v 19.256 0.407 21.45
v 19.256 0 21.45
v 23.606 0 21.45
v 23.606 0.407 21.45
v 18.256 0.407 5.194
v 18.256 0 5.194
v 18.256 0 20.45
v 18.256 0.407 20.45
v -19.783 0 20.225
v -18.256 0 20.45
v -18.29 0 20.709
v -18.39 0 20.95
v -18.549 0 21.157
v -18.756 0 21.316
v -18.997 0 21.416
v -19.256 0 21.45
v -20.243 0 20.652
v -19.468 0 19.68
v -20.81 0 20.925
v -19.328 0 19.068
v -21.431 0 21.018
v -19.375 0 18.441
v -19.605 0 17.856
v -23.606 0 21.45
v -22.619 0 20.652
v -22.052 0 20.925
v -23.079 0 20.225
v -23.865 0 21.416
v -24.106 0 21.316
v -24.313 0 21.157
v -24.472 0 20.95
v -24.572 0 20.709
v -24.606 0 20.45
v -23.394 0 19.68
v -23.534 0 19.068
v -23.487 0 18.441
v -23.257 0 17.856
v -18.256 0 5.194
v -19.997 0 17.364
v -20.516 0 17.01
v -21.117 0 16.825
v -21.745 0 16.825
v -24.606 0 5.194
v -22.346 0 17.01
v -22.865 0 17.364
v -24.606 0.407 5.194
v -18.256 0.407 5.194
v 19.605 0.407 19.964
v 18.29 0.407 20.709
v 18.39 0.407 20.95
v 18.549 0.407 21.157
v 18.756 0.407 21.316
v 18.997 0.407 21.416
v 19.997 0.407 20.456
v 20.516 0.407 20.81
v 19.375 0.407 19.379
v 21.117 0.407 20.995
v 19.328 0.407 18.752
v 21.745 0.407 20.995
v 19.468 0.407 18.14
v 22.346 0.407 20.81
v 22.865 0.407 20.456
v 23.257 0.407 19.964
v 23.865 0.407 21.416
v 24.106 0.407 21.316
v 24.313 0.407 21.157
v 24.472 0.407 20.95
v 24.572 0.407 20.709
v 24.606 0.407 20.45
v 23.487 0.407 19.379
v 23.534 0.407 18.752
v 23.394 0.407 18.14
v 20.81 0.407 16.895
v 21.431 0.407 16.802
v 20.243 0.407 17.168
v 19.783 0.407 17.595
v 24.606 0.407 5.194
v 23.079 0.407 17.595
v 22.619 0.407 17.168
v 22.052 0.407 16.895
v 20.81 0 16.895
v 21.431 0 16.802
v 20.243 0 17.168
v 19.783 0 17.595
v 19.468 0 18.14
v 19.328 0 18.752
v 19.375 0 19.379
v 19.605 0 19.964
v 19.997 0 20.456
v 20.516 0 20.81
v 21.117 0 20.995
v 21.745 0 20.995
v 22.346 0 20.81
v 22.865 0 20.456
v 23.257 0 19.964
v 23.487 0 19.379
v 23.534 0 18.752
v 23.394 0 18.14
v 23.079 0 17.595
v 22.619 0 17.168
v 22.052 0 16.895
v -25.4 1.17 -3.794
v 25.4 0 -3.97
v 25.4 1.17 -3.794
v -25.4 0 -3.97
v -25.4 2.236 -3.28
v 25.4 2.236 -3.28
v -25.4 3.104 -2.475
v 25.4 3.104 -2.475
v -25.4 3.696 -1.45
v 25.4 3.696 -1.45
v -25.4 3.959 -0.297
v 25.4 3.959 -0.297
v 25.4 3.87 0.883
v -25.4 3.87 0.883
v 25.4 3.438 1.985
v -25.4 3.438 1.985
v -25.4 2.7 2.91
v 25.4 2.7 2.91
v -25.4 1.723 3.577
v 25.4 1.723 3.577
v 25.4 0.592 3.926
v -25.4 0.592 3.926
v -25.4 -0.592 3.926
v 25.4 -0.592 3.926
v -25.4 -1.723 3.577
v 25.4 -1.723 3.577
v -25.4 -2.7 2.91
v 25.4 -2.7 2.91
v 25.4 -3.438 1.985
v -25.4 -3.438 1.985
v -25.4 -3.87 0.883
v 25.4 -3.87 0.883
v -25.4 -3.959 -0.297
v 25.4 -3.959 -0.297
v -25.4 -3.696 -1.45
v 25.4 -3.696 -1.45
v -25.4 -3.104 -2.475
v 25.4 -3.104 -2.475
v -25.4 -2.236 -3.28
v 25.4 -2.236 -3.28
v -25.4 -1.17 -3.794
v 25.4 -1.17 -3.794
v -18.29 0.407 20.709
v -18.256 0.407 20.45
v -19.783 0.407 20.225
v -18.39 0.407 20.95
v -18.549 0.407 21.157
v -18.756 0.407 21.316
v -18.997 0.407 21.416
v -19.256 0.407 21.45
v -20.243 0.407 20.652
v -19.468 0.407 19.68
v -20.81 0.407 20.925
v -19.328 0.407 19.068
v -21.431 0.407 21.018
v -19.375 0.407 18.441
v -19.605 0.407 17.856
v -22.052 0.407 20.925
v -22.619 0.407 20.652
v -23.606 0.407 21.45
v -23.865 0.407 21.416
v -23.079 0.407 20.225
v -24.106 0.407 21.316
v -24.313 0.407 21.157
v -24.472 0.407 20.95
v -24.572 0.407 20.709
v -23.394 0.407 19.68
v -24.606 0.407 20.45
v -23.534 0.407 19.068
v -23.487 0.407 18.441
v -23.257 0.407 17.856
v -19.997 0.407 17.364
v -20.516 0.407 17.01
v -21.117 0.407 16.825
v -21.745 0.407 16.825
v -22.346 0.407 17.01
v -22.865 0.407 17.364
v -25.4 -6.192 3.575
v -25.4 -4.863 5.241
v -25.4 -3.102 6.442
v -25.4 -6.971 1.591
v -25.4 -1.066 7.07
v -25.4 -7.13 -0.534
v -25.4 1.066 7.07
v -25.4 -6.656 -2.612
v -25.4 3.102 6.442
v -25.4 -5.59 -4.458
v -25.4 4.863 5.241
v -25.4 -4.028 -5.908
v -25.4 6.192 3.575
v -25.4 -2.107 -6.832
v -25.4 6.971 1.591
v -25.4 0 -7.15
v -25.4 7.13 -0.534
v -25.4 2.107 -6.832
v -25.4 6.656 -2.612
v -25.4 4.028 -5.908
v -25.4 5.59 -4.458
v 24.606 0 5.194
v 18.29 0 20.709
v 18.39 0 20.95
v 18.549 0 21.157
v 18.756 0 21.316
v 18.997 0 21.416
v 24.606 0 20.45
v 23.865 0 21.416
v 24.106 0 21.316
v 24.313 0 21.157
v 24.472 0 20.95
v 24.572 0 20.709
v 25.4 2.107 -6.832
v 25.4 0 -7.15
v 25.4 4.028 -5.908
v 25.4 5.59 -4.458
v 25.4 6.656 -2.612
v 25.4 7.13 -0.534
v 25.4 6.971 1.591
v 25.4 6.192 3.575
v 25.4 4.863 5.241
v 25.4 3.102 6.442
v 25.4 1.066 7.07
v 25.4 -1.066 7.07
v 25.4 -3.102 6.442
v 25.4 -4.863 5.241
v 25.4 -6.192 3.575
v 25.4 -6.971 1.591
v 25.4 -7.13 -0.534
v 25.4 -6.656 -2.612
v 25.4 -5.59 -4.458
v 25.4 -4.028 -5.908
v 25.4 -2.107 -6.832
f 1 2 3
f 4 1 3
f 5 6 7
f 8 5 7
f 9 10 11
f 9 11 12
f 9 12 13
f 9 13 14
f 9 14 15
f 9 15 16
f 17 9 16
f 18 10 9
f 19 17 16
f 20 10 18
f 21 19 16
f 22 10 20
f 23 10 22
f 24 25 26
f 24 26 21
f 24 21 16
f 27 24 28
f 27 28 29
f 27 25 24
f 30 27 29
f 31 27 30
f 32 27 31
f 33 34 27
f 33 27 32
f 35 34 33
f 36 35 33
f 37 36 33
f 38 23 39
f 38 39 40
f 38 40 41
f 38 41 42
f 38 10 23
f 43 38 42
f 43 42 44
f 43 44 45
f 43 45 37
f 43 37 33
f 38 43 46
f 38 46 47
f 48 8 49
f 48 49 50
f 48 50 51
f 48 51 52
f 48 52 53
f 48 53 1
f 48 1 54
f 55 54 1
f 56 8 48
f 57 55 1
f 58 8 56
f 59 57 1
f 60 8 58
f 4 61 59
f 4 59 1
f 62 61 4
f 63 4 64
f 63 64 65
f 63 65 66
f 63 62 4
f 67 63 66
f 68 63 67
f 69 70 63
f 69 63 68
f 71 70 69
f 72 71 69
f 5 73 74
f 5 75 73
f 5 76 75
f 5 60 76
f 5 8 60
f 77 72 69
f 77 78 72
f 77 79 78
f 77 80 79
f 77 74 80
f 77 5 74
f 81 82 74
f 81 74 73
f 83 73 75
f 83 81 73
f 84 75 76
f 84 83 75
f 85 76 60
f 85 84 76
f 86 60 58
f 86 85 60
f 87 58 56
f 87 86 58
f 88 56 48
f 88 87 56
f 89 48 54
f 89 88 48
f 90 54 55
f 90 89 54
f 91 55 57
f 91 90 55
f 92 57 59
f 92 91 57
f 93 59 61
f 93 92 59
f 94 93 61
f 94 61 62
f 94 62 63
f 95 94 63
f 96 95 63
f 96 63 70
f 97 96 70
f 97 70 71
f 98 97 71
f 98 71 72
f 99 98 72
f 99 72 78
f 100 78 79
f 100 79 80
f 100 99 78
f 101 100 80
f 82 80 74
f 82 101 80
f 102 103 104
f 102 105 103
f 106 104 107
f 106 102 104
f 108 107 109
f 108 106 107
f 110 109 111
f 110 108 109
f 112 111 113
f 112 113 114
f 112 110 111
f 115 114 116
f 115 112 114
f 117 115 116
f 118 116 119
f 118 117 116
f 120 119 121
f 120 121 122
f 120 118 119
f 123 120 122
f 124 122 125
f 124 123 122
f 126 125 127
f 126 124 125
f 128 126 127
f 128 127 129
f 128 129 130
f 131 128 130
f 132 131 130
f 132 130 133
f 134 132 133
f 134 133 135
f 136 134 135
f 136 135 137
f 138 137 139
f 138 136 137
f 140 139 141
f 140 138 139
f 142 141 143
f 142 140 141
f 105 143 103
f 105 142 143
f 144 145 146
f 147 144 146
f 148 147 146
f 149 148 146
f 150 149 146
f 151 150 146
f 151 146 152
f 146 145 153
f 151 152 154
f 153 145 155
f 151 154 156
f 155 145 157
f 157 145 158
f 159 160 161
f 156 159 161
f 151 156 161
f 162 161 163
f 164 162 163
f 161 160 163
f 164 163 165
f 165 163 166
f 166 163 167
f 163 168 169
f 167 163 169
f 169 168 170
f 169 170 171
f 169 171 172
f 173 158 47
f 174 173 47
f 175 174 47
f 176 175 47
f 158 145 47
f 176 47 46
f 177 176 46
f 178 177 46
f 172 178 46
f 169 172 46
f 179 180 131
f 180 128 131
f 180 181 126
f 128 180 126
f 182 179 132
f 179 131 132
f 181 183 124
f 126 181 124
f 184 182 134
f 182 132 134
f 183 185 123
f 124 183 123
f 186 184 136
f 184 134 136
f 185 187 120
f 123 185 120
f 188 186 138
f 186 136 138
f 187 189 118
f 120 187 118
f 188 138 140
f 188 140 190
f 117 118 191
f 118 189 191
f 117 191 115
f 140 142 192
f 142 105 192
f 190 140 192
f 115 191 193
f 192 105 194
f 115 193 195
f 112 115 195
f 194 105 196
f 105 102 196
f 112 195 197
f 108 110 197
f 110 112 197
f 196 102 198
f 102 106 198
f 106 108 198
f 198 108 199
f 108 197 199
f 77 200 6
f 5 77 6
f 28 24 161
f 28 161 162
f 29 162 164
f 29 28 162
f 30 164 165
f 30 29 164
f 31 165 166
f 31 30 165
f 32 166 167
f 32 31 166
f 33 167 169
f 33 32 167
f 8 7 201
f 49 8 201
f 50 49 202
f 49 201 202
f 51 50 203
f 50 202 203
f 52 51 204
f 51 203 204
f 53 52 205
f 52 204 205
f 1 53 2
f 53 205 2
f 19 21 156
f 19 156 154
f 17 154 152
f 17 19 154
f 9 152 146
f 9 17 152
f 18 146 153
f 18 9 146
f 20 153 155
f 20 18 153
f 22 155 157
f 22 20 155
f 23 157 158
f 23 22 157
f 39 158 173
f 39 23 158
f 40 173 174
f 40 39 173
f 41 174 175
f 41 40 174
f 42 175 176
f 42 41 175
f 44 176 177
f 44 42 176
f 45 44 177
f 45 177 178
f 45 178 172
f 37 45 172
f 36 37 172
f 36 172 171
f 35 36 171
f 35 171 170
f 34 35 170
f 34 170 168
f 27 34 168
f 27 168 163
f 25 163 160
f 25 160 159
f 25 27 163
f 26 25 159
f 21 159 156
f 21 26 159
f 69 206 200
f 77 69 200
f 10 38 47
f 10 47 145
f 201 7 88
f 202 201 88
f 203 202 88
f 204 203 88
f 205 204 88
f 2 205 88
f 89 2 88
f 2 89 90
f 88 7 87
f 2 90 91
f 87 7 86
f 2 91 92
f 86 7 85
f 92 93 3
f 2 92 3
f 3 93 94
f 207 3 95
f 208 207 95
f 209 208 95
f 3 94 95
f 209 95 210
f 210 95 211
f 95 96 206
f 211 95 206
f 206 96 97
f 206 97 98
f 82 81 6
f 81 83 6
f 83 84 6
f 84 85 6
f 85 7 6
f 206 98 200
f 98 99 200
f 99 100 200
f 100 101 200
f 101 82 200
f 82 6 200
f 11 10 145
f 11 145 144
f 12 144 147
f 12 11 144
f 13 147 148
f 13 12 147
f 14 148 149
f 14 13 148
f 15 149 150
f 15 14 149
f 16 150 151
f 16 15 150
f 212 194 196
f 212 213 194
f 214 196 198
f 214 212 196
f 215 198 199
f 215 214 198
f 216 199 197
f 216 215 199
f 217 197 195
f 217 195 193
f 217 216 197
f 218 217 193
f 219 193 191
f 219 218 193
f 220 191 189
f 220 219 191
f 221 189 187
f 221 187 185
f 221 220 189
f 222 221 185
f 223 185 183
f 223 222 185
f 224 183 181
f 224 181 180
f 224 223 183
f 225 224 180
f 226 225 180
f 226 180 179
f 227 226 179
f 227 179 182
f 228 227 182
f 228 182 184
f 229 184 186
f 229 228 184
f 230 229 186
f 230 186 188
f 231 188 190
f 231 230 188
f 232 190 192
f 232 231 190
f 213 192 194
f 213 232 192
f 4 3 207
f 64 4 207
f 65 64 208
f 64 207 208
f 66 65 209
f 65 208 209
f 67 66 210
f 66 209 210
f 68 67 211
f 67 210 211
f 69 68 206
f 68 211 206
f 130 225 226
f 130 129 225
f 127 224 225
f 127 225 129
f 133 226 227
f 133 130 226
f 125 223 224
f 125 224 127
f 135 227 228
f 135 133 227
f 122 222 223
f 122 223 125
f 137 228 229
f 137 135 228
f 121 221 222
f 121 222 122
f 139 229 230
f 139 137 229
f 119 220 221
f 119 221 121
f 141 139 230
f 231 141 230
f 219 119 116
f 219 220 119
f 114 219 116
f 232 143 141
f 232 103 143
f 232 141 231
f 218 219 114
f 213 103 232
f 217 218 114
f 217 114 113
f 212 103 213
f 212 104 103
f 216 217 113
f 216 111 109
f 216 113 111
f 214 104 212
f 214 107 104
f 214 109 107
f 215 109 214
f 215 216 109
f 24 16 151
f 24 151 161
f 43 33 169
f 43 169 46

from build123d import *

# Parameters (mm, degrees)
SKETCH1_R             = 7.15
SKETCH1_R_2           = 3.97
BOSS_EXTRUDE1_DEPTH   = 25.4
SKETCH2_R             = 2.1085
BOSS_EXTRUDE2_DEPTH   = 0.407
BOSS_EXTRUDE2_2_DEPTH = 0.407


with BuildPart() as part:
    # Sketch1 → Boss-Extrude1 (new, symmetric)
    with BuildSketch(Plane(origin=(0, 0, 0), x_dir=(0, 0, -1), z_dir=(1, 0, 0))):
        Circle(SKETCH1_R)
        Circle(SKETCH1_R_2, mode=Mode.SUBTRACT)
    extrude(amount=BOSS_EXTRUDE1_DEPTH, both=True)


with BuildPart() as body_2:
    # Sketch2 → Boss-Extrude2 (new body)
    with BuildSketch(Plane(origin=(0, 0, 0), x_dir=(1, 0, 0), z_dir=(0, 1, 0))):
        with BuildLine():
            Line((-24.606, -5.19404127), (-18.256, -5.19404127))
            Line((-18.256, -5.19404127), (-18.256, -20.45))
            ThreePointArc((-18.256, -20.45), (-18.548893219, -21.157106781), (-19.256, -21.45))
            Line((-19.256, -21.45), (-23.606, -21.45))
            ThreePointArc((-23.606, -21.45), (-24.313106781, -21.157106781), (-24.606, -20.45))
            Line((-24.606, -20.45), (-24.606, -5.19404127))
        make_face()
        with Locations(Location((-21.431, -18.91, 0), (0, 0, 270))):
            Circle(SKETCH2_R, mode=Mode.SUBTRACT)
    extrude(amount=BOSS_EXTRUDE2_DEPTH)


with BuildPart() as body_3:
    # Sketch2 → Boss-Extrude2 2 (new body)
    with BuildSketch(Plane(origin=(0, 0, 0), x_dir=(1, 0, 0), z_dir=(0, 1, 0))):
        with BuildLine():
            Line((18.256, -5.19404127), (18.256, -20.45))
            ThreePointArc((18.256, -20.45), (18.548893219, -21.157106781), (19.256, -21.45))
            Line((19.256, -21.45), (23.606, -21.45))
            ThreePointArc((23.606, -21.45), (24.313106781, -21.157106781), (24.606, -20.45))
            Line((24.606, -20.45), (24.606, -5.19404127))
            Line((24.606, -5.19404127), (18.256, -5.19404127))
        make_face()
        with Locations(Location((21.431, -18.91, 0), (0, 0, 90))):
            Circle(SKETCH2_R, mode=Mode.SUBTRACT)
    extrude(amount=BOSS_EXTRUDE2_2_DEPTH)


solid = Compound([part.part, body_2.part, body_3.part])
